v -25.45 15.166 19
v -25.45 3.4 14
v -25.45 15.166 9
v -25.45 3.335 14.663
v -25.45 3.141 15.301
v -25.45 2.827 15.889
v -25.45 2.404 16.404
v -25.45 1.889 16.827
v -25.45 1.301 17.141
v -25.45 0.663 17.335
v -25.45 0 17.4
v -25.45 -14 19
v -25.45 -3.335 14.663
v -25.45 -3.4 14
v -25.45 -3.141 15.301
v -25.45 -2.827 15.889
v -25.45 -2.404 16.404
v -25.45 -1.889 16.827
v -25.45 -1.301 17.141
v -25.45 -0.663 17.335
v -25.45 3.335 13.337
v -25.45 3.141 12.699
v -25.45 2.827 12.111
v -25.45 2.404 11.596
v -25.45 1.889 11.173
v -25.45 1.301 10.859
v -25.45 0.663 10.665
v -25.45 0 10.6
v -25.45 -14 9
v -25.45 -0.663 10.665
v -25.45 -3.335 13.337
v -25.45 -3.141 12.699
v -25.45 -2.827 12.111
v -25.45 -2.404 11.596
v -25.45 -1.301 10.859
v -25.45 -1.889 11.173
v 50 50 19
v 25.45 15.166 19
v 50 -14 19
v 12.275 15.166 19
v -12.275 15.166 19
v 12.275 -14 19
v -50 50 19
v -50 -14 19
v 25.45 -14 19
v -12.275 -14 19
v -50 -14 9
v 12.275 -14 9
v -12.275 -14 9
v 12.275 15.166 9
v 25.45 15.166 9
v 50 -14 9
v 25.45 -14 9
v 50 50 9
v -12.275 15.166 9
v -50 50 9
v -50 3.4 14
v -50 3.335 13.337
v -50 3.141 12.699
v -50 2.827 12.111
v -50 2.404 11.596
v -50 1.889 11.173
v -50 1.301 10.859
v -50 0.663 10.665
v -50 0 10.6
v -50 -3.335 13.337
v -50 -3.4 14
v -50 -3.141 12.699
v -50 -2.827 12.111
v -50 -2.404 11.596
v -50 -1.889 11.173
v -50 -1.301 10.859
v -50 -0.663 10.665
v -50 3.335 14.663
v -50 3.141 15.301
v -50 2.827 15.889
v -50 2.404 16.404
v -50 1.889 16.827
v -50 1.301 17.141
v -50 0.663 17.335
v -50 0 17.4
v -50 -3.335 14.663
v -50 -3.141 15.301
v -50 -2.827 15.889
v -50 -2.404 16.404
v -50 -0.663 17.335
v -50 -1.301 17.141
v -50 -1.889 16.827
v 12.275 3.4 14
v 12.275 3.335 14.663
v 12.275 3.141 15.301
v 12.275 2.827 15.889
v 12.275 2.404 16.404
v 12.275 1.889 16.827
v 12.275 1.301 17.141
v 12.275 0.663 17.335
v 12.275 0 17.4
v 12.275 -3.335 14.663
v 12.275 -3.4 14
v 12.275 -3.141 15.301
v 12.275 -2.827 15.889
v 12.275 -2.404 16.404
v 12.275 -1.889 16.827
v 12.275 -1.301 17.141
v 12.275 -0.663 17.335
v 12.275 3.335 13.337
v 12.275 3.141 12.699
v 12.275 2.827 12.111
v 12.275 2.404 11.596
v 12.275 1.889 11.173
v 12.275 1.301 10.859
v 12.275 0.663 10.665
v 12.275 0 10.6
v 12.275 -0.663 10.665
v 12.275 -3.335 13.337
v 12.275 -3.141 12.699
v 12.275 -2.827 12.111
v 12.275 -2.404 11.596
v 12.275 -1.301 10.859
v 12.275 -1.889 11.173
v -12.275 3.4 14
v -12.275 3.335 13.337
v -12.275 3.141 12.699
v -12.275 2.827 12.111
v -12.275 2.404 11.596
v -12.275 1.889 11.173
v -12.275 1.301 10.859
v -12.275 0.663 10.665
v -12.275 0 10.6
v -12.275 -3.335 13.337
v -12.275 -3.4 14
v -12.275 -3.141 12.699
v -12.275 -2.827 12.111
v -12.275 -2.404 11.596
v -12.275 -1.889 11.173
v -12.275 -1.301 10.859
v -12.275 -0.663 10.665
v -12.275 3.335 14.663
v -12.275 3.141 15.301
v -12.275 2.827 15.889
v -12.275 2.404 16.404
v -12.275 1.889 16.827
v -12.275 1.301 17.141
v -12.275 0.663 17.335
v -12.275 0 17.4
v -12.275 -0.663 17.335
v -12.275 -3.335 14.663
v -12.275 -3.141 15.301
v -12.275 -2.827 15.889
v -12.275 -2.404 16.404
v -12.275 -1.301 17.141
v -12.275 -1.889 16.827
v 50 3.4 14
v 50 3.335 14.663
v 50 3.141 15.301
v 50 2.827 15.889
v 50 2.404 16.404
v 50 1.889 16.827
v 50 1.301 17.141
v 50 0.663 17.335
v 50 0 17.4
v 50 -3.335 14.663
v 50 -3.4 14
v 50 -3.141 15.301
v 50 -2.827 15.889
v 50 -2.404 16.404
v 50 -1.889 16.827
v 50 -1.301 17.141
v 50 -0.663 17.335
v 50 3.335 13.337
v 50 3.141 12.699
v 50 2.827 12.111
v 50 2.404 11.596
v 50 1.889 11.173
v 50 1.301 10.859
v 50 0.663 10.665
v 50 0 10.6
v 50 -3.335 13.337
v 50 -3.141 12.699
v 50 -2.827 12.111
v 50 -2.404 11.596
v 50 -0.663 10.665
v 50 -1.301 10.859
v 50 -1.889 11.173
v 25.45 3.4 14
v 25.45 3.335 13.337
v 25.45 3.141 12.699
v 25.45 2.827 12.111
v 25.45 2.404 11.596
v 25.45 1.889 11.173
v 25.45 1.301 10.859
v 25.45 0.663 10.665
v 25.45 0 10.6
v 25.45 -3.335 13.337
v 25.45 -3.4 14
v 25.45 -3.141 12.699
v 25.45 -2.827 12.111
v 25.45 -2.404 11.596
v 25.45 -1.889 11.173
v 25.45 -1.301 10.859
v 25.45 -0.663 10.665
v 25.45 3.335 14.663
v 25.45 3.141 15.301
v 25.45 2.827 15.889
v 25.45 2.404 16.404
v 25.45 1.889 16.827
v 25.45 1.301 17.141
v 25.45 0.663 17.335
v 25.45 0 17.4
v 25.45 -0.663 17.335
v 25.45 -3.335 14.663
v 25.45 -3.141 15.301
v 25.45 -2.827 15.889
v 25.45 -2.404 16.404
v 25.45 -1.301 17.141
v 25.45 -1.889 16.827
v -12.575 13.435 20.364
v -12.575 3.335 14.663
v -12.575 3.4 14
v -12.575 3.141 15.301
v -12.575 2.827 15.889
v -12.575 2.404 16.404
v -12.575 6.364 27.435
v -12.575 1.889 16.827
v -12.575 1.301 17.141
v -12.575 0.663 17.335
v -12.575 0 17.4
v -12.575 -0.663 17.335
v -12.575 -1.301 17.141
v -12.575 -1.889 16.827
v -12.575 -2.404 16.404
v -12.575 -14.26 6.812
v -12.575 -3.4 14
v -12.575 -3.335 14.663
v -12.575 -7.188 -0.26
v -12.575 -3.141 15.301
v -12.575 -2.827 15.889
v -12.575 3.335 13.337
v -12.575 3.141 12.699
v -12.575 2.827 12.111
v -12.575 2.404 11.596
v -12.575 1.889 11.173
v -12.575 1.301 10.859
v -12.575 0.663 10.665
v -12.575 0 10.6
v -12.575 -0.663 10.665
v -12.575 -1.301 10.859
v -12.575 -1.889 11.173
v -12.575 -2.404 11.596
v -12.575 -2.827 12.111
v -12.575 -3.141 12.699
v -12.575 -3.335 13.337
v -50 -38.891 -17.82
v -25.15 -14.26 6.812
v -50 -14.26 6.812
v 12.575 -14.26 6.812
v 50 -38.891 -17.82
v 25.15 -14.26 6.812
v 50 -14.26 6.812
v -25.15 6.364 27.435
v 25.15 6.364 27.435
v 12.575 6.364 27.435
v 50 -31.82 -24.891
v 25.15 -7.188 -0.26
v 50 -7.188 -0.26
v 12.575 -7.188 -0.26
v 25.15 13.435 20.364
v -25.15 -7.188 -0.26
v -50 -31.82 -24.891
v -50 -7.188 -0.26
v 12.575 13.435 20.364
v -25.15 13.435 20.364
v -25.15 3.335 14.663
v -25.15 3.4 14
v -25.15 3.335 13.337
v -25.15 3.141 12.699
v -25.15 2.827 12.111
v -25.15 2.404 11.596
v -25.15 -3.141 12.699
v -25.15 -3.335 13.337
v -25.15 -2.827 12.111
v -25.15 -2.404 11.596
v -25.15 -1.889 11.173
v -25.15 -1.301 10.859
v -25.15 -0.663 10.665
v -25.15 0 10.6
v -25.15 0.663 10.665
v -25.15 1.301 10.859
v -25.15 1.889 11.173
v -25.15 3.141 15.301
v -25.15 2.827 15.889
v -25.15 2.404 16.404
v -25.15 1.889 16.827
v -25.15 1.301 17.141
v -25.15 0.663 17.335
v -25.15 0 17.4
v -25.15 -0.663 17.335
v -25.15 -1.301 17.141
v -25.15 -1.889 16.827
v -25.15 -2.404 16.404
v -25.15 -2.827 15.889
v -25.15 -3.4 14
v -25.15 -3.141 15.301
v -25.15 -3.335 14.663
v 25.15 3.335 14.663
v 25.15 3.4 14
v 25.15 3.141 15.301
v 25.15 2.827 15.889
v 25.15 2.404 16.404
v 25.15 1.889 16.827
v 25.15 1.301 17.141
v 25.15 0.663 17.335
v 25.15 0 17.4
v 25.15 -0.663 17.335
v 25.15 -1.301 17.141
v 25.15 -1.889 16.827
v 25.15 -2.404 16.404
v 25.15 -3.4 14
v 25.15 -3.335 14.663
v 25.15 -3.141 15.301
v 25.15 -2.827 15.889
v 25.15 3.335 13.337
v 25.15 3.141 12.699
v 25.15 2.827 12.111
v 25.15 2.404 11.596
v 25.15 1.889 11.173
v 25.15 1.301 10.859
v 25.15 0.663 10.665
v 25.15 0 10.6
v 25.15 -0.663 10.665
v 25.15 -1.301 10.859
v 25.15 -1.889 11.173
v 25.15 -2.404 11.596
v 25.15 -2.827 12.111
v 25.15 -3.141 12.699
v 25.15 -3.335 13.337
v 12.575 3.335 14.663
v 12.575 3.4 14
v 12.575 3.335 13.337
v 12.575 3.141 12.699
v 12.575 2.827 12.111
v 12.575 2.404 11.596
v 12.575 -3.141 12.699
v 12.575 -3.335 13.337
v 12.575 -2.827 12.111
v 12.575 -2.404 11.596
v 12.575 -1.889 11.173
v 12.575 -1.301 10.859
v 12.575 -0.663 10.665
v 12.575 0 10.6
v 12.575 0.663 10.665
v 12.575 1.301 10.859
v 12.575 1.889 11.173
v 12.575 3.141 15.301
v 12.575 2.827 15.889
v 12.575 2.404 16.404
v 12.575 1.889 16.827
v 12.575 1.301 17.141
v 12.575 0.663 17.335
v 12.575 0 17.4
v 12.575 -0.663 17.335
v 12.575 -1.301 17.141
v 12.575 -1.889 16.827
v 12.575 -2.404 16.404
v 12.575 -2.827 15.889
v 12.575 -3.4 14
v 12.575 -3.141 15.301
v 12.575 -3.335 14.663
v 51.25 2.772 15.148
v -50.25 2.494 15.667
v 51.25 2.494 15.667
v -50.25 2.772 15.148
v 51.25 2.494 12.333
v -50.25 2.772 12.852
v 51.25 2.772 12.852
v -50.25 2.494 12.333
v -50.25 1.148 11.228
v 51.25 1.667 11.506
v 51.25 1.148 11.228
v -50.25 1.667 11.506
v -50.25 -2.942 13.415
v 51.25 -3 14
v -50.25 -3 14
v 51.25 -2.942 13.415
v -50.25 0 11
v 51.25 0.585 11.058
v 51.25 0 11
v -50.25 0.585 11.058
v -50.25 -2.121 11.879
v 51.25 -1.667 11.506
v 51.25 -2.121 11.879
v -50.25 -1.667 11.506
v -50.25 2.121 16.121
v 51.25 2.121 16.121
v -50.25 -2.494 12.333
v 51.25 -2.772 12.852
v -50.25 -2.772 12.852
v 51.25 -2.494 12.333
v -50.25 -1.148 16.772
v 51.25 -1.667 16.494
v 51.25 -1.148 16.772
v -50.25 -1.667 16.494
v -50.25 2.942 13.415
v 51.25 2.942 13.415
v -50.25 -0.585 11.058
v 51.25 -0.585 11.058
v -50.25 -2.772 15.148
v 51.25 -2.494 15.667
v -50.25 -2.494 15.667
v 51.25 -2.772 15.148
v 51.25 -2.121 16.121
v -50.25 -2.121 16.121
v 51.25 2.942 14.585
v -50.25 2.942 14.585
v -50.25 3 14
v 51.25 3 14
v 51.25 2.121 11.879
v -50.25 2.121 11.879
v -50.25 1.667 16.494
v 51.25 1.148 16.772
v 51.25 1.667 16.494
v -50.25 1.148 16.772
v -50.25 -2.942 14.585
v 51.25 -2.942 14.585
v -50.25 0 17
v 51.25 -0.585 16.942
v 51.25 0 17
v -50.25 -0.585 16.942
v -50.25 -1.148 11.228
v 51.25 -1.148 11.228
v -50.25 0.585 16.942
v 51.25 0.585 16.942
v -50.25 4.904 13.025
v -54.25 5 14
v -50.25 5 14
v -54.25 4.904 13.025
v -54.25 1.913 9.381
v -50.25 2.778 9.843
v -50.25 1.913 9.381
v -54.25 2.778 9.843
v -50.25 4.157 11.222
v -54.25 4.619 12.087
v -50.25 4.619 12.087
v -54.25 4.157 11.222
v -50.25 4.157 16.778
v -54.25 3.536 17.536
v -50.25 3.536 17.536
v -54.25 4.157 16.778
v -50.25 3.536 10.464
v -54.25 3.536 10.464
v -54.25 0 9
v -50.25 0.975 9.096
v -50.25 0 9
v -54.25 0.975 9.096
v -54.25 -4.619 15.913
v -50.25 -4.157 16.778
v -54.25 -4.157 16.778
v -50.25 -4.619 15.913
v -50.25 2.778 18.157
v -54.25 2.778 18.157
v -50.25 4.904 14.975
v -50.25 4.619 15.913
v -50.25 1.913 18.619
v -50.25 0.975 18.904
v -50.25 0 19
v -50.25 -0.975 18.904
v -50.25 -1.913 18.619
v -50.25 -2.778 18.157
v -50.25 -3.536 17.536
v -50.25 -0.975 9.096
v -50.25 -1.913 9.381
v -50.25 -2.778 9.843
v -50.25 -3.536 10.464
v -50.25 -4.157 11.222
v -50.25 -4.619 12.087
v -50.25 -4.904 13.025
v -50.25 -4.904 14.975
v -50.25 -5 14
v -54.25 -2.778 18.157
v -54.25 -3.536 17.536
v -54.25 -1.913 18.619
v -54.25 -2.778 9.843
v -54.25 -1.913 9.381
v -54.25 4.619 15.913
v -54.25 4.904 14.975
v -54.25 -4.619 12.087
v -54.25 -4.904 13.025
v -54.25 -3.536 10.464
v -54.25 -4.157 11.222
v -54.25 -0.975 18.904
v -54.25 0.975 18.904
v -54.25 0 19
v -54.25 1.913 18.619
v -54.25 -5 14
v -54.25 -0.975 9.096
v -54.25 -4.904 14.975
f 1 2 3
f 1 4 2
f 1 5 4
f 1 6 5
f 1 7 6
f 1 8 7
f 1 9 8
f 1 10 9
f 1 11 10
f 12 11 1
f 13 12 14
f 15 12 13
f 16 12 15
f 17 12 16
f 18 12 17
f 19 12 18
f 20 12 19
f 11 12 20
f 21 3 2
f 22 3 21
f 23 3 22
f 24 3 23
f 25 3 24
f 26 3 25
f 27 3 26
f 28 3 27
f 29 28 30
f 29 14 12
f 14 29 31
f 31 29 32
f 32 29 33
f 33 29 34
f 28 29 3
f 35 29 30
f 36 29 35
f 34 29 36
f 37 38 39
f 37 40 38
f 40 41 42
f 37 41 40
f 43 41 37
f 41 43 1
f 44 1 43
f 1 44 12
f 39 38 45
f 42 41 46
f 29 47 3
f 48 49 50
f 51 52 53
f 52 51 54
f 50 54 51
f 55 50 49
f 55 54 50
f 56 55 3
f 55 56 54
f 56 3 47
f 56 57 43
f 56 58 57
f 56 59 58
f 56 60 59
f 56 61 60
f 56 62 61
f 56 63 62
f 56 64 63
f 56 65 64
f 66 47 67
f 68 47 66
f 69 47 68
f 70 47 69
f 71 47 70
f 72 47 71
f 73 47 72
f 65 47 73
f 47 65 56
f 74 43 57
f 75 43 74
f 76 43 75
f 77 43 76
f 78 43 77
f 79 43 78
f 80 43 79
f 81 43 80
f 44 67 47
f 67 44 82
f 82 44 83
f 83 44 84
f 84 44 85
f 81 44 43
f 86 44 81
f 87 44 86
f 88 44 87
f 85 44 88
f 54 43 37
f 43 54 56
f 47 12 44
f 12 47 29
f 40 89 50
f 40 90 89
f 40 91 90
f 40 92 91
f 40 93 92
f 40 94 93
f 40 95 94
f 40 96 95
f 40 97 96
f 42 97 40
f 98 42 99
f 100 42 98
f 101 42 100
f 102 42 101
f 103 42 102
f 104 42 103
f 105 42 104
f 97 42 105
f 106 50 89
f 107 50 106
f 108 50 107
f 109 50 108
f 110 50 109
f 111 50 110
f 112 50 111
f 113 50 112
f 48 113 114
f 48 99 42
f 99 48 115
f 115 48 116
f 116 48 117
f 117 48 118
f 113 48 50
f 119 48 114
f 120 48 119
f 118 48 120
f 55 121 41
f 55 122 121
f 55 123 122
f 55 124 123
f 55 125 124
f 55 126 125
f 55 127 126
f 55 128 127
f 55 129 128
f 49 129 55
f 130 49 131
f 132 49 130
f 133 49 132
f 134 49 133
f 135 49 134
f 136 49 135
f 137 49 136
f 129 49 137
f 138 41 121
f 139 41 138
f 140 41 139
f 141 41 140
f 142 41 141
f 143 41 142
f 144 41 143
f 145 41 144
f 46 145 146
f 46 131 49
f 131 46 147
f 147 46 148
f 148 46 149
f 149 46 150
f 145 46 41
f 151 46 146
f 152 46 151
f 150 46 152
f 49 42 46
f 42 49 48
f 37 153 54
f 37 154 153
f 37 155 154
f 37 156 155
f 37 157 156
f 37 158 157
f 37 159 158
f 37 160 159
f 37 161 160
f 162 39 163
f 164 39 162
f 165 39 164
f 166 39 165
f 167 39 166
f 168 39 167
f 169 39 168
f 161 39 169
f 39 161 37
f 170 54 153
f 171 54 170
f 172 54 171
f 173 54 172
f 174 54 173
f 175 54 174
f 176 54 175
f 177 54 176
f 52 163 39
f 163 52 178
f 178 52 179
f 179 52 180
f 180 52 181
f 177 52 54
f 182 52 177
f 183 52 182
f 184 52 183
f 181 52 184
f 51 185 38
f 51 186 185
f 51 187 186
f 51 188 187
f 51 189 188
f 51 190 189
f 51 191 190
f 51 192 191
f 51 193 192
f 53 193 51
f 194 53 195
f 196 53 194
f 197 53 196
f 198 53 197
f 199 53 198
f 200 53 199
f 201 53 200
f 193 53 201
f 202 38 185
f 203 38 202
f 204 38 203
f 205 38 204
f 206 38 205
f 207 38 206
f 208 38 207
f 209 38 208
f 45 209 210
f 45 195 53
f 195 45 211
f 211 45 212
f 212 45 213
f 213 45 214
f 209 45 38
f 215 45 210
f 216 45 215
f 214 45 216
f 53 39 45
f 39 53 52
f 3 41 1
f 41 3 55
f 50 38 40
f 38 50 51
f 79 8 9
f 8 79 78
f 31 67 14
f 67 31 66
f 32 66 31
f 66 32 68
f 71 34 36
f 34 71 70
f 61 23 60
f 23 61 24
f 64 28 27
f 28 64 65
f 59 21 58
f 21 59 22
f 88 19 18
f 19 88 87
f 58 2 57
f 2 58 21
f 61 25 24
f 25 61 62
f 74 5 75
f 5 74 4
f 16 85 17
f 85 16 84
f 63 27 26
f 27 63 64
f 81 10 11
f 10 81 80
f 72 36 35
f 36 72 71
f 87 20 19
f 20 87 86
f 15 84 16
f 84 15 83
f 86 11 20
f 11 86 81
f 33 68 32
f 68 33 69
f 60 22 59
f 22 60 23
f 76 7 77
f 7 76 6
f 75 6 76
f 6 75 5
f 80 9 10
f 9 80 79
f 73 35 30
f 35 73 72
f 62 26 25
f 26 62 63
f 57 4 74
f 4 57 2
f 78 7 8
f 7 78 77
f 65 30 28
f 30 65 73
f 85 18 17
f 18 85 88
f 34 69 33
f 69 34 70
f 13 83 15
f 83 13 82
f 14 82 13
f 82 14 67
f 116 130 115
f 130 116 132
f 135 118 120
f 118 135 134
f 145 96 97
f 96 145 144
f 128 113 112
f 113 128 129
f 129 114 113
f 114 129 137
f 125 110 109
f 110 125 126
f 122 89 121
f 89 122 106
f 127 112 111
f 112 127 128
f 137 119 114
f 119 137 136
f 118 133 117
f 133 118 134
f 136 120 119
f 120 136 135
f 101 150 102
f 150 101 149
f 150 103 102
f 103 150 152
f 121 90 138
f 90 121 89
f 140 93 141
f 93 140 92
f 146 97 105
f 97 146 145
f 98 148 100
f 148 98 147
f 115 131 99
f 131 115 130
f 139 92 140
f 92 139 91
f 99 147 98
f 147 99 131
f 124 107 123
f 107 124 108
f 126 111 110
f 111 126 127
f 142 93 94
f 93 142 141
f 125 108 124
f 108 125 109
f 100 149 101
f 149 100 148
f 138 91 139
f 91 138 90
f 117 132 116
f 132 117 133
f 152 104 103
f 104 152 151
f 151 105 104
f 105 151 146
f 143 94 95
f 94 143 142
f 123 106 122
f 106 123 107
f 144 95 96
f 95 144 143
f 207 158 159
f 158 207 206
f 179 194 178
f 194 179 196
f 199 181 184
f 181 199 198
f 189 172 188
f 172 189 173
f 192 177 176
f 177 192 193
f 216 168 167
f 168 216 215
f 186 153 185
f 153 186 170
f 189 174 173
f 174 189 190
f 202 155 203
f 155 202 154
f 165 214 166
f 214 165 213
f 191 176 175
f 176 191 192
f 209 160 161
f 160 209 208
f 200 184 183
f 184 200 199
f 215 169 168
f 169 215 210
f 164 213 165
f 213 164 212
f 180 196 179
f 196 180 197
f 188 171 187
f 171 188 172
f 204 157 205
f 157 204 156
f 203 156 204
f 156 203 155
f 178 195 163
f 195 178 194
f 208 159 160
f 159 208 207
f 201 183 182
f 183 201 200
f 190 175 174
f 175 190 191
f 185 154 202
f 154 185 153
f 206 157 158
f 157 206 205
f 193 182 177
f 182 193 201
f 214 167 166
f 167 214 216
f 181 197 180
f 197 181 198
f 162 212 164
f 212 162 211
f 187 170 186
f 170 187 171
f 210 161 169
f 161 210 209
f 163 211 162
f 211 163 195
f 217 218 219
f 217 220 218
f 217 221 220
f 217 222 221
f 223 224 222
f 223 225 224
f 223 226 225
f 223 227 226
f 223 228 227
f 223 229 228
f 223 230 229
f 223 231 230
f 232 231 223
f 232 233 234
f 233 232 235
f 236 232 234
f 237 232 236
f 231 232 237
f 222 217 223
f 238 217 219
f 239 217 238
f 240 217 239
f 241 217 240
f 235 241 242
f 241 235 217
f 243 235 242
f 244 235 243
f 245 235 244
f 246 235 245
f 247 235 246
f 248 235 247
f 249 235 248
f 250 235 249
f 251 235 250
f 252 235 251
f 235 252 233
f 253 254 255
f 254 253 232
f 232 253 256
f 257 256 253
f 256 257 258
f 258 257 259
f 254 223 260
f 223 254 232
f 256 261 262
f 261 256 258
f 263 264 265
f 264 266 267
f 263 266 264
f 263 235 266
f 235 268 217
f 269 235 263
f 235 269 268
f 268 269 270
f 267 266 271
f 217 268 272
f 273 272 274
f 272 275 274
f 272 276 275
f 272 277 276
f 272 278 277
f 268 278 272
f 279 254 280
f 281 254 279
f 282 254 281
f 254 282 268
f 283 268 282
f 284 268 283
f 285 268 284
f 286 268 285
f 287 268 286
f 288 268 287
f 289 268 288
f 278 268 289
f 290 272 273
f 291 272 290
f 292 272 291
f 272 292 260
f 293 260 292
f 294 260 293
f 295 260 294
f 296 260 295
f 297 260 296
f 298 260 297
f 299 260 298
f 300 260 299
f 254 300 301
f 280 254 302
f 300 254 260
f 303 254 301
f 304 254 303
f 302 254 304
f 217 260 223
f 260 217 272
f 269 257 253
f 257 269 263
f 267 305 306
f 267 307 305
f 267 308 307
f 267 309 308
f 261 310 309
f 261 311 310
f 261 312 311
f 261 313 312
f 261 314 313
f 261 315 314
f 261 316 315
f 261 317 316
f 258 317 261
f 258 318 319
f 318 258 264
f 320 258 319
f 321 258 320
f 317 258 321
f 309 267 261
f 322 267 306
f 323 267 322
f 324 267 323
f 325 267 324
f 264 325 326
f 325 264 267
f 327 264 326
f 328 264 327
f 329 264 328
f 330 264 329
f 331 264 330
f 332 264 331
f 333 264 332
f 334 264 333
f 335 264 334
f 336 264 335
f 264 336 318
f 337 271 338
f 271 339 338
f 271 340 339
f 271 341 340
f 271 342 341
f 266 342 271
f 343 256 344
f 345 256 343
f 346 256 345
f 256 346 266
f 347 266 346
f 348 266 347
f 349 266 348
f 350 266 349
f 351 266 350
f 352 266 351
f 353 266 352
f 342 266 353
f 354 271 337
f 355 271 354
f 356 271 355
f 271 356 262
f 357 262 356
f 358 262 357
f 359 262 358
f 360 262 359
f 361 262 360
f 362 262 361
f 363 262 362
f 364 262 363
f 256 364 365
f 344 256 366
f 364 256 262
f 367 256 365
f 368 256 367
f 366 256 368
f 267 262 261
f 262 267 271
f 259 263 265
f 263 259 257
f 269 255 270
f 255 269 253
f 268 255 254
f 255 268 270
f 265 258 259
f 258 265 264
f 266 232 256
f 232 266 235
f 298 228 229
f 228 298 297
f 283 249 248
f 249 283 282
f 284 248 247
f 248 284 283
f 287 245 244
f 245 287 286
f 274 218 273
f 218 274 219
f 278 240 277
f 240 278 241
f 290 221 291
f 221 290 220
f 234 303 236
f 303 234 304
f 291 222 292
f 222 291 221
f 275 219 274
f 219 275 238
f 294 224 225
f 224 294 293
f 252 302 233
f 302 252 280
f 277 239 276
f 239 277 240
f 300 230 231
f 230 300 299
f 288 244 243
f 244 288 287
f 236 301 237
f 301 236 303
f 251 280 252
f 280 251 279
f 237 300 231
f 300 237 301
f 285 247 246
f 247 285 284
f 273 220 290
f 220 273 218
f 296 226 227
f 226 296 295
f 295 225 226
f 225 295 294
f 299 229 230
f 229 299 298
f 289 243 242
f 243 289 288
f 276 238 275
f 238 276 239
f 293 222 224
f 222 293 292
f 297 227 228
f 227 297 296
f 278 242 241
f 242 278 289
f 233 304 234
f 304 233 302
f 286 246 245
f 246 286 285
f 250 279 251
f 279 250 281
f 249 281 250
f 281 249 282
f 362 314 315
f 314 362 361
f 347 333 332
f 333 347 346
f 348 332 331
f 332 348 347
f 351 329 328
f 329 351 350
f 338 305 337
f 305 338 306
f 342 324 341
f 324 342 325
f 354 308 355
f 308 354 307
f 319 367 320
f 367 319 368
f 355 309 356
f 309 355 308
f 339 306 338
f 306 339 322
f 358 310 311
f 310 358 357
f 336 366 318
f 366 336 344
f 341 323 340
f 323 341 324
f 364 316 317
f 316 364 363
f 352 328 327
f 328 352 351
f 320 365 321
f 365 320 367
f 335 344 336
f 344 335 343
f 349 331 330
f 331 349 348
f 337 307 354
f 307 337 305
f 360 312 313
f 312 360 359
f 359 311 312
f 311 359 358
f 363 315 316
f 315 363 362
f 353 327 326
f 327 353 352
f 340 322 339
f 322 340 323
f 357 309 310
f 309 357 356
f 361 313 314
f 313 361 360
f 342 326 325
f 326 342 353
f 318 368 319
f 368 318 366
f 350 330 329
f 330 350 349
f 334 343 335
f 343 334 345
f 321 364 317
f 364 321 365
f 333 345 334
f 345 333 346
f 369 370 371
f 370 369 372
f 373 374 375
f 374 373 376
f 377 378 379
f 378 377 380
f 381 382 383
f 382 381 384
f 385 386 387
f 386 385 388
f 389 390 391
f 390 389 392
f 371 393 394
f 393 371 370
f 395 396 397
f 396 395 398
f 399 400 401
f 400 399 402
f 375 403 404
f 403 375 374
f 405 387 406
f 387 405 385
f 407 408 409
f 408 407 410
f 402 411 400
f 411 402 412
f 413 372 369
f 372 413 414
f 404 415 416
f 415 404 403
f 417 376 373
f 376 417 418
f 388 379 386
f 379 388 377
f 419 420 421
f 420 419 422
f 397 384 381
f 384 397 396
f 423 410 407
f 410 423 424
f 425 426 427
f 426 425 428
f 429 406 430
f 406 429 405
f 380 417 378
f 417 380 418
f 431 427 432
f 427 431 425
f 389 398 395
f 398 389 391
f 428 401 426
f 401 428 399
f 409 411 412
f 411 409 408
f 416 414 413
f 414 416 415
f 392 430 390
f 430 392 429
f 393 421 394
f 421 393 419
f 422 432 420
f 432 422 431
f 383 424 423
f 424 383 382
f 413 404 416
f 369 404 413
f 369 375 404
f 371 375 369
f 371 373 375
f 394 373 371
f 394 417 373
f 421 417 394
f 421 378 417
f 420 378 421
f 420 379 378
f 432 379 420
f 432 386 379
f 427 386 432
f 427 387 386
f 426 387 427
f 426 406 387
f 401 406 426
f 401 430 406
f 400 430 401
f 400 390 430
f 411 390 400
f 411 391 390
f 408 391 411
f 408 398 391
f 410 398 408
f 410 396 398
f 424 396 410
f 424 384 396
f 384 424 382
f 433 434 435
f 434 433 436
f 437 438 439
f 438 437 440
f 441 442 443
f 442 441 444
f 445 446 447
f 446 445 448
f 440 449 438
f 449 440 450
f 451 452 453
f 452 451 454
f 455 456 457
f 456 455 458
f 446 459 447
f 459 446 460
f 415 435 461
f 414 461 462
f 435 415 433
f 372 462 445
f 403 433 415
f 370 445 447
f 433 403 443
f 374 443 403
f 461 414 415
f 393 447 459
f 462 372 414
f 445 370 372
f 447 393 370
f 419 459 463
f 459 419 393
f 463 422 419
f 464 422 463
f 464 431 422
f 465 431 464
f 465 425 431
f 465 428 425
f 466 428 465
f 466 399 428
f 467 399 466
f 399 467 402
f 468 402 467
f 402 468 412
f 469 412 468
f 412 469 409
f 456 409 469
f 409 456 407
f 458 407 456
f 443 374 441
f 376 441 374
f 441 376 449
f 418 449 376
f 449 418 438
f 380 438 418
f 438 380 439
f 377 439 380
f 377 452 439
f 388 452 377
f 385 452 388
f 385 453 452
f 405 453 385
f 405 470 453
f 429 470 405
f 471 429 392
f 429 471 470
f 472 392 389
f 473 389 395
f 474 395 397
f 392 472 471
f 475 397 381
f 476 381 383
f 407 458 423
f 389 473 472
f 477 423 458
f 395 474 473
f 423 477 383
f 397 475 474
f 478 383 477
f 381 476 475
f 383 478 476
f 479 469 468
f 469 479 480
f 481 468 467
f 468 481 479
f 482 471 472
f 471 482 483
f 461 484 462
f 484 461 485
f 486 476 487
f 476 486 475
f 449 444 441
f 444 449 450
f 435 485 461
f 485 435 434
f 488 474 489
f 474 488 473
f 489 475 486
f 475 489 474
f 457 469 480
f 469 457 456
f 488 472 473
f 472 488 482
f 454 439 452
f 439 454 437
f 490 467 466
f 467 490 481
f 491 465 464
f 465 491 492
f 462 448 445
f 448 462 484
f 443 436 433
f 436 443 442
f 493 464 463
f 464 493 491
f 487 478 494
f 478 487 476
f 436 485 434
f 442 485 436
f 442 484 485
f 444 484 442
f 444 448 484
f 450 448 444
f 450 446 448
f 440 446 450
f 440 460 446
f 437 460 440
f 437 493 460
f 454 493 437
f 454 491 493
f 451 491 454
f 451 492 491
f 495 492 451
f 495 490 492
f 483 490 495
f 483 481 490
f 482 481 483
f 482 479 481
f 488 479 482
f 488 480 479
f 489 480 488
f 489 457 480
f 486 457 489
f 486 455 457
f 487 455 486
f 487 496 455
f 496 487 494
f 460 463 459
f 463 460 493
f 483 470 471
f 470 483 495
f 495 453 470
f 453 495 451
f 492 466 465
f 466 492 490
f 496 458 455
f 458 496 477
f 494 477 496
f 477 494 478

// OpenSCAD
$fn = 32;

// ------------------------------------------------------------------------
// Butt hinge: hinge 100 mm, leaf swung 45 deg
// Every part is its own module, assembly() places every instance.
// ------------------------------------------------------------------------

// --- part 1 ---
module hinge_base() {
  difference() {
    union() {
      translate([-50, -14, -5]) cube([24.55, 64, 10]);
      translate([-12.275, -14, -5]) cube([24.55, 64, 10]);
      translate([25.45, -14, -5]) cube([24.55, 64, 10]);
      translate([-50, 15.166, -5]) cube([100, 34.834, 10]);
    }
    translate([-37.725, 0, 0]) rotate([0, 90, 0]) cylinder(h = 26.55, d = 6.8, center = true);
    translate([0, 0, 0]) rotate([0, 90, 0]) cylinder(h = 26.55, d = 6.8, center = true);
    translate([37.725, 0, 0]) rotate([0, 90, 0]) cylinder(h = 26.55, d = 6.8, center = true);
  }
}

// --- part 2 ---
module hinge_mover() {
  difference() {
    union() {
      translate([-25.15, -50, -5]) cube([12.575, 64, 10]);
      translate([12.575, -50, -5]) cube([12.575, 64, 10]);
      translate([-50, -50, -5]) cube([100, 34.834, 10]);
    }
    translate([-18.863, 0, 0]) rotate([0, 90, 0]) cylinder(h = 14.575, d = 6.8, center = true);
    translate([18.863, 0, 0]) rotate([0, 90, 0]) cylinder(h = 14.575, d = 6.8, center = true);
  }
}

// --- part 3 ---
module hinge_pin() {
  rotate([0, 90, 0]) cylinder(h = 102.5, d = 6, center = true);
  translate([-54.25, 0, 0]) rotate([0, 90, 0]) cylinder(h = 4, d = 10);
}

// --- assembly ---
module assembly() {
  color([0.80, 0.24, 0.20]) translate([0, 0, 14]) rotate([0, 0, 0]) hinge_base();
  color([0.20, 0.45, 0.75]) translate([0, 0, 14]) rotate([45, 0, 0]) hinge_mover();
  color([0.25, 0.62, 0.32]) translate([0, 0, 14]) rotate([0, 0, 0]) hinge_pin();
}

assembly();
